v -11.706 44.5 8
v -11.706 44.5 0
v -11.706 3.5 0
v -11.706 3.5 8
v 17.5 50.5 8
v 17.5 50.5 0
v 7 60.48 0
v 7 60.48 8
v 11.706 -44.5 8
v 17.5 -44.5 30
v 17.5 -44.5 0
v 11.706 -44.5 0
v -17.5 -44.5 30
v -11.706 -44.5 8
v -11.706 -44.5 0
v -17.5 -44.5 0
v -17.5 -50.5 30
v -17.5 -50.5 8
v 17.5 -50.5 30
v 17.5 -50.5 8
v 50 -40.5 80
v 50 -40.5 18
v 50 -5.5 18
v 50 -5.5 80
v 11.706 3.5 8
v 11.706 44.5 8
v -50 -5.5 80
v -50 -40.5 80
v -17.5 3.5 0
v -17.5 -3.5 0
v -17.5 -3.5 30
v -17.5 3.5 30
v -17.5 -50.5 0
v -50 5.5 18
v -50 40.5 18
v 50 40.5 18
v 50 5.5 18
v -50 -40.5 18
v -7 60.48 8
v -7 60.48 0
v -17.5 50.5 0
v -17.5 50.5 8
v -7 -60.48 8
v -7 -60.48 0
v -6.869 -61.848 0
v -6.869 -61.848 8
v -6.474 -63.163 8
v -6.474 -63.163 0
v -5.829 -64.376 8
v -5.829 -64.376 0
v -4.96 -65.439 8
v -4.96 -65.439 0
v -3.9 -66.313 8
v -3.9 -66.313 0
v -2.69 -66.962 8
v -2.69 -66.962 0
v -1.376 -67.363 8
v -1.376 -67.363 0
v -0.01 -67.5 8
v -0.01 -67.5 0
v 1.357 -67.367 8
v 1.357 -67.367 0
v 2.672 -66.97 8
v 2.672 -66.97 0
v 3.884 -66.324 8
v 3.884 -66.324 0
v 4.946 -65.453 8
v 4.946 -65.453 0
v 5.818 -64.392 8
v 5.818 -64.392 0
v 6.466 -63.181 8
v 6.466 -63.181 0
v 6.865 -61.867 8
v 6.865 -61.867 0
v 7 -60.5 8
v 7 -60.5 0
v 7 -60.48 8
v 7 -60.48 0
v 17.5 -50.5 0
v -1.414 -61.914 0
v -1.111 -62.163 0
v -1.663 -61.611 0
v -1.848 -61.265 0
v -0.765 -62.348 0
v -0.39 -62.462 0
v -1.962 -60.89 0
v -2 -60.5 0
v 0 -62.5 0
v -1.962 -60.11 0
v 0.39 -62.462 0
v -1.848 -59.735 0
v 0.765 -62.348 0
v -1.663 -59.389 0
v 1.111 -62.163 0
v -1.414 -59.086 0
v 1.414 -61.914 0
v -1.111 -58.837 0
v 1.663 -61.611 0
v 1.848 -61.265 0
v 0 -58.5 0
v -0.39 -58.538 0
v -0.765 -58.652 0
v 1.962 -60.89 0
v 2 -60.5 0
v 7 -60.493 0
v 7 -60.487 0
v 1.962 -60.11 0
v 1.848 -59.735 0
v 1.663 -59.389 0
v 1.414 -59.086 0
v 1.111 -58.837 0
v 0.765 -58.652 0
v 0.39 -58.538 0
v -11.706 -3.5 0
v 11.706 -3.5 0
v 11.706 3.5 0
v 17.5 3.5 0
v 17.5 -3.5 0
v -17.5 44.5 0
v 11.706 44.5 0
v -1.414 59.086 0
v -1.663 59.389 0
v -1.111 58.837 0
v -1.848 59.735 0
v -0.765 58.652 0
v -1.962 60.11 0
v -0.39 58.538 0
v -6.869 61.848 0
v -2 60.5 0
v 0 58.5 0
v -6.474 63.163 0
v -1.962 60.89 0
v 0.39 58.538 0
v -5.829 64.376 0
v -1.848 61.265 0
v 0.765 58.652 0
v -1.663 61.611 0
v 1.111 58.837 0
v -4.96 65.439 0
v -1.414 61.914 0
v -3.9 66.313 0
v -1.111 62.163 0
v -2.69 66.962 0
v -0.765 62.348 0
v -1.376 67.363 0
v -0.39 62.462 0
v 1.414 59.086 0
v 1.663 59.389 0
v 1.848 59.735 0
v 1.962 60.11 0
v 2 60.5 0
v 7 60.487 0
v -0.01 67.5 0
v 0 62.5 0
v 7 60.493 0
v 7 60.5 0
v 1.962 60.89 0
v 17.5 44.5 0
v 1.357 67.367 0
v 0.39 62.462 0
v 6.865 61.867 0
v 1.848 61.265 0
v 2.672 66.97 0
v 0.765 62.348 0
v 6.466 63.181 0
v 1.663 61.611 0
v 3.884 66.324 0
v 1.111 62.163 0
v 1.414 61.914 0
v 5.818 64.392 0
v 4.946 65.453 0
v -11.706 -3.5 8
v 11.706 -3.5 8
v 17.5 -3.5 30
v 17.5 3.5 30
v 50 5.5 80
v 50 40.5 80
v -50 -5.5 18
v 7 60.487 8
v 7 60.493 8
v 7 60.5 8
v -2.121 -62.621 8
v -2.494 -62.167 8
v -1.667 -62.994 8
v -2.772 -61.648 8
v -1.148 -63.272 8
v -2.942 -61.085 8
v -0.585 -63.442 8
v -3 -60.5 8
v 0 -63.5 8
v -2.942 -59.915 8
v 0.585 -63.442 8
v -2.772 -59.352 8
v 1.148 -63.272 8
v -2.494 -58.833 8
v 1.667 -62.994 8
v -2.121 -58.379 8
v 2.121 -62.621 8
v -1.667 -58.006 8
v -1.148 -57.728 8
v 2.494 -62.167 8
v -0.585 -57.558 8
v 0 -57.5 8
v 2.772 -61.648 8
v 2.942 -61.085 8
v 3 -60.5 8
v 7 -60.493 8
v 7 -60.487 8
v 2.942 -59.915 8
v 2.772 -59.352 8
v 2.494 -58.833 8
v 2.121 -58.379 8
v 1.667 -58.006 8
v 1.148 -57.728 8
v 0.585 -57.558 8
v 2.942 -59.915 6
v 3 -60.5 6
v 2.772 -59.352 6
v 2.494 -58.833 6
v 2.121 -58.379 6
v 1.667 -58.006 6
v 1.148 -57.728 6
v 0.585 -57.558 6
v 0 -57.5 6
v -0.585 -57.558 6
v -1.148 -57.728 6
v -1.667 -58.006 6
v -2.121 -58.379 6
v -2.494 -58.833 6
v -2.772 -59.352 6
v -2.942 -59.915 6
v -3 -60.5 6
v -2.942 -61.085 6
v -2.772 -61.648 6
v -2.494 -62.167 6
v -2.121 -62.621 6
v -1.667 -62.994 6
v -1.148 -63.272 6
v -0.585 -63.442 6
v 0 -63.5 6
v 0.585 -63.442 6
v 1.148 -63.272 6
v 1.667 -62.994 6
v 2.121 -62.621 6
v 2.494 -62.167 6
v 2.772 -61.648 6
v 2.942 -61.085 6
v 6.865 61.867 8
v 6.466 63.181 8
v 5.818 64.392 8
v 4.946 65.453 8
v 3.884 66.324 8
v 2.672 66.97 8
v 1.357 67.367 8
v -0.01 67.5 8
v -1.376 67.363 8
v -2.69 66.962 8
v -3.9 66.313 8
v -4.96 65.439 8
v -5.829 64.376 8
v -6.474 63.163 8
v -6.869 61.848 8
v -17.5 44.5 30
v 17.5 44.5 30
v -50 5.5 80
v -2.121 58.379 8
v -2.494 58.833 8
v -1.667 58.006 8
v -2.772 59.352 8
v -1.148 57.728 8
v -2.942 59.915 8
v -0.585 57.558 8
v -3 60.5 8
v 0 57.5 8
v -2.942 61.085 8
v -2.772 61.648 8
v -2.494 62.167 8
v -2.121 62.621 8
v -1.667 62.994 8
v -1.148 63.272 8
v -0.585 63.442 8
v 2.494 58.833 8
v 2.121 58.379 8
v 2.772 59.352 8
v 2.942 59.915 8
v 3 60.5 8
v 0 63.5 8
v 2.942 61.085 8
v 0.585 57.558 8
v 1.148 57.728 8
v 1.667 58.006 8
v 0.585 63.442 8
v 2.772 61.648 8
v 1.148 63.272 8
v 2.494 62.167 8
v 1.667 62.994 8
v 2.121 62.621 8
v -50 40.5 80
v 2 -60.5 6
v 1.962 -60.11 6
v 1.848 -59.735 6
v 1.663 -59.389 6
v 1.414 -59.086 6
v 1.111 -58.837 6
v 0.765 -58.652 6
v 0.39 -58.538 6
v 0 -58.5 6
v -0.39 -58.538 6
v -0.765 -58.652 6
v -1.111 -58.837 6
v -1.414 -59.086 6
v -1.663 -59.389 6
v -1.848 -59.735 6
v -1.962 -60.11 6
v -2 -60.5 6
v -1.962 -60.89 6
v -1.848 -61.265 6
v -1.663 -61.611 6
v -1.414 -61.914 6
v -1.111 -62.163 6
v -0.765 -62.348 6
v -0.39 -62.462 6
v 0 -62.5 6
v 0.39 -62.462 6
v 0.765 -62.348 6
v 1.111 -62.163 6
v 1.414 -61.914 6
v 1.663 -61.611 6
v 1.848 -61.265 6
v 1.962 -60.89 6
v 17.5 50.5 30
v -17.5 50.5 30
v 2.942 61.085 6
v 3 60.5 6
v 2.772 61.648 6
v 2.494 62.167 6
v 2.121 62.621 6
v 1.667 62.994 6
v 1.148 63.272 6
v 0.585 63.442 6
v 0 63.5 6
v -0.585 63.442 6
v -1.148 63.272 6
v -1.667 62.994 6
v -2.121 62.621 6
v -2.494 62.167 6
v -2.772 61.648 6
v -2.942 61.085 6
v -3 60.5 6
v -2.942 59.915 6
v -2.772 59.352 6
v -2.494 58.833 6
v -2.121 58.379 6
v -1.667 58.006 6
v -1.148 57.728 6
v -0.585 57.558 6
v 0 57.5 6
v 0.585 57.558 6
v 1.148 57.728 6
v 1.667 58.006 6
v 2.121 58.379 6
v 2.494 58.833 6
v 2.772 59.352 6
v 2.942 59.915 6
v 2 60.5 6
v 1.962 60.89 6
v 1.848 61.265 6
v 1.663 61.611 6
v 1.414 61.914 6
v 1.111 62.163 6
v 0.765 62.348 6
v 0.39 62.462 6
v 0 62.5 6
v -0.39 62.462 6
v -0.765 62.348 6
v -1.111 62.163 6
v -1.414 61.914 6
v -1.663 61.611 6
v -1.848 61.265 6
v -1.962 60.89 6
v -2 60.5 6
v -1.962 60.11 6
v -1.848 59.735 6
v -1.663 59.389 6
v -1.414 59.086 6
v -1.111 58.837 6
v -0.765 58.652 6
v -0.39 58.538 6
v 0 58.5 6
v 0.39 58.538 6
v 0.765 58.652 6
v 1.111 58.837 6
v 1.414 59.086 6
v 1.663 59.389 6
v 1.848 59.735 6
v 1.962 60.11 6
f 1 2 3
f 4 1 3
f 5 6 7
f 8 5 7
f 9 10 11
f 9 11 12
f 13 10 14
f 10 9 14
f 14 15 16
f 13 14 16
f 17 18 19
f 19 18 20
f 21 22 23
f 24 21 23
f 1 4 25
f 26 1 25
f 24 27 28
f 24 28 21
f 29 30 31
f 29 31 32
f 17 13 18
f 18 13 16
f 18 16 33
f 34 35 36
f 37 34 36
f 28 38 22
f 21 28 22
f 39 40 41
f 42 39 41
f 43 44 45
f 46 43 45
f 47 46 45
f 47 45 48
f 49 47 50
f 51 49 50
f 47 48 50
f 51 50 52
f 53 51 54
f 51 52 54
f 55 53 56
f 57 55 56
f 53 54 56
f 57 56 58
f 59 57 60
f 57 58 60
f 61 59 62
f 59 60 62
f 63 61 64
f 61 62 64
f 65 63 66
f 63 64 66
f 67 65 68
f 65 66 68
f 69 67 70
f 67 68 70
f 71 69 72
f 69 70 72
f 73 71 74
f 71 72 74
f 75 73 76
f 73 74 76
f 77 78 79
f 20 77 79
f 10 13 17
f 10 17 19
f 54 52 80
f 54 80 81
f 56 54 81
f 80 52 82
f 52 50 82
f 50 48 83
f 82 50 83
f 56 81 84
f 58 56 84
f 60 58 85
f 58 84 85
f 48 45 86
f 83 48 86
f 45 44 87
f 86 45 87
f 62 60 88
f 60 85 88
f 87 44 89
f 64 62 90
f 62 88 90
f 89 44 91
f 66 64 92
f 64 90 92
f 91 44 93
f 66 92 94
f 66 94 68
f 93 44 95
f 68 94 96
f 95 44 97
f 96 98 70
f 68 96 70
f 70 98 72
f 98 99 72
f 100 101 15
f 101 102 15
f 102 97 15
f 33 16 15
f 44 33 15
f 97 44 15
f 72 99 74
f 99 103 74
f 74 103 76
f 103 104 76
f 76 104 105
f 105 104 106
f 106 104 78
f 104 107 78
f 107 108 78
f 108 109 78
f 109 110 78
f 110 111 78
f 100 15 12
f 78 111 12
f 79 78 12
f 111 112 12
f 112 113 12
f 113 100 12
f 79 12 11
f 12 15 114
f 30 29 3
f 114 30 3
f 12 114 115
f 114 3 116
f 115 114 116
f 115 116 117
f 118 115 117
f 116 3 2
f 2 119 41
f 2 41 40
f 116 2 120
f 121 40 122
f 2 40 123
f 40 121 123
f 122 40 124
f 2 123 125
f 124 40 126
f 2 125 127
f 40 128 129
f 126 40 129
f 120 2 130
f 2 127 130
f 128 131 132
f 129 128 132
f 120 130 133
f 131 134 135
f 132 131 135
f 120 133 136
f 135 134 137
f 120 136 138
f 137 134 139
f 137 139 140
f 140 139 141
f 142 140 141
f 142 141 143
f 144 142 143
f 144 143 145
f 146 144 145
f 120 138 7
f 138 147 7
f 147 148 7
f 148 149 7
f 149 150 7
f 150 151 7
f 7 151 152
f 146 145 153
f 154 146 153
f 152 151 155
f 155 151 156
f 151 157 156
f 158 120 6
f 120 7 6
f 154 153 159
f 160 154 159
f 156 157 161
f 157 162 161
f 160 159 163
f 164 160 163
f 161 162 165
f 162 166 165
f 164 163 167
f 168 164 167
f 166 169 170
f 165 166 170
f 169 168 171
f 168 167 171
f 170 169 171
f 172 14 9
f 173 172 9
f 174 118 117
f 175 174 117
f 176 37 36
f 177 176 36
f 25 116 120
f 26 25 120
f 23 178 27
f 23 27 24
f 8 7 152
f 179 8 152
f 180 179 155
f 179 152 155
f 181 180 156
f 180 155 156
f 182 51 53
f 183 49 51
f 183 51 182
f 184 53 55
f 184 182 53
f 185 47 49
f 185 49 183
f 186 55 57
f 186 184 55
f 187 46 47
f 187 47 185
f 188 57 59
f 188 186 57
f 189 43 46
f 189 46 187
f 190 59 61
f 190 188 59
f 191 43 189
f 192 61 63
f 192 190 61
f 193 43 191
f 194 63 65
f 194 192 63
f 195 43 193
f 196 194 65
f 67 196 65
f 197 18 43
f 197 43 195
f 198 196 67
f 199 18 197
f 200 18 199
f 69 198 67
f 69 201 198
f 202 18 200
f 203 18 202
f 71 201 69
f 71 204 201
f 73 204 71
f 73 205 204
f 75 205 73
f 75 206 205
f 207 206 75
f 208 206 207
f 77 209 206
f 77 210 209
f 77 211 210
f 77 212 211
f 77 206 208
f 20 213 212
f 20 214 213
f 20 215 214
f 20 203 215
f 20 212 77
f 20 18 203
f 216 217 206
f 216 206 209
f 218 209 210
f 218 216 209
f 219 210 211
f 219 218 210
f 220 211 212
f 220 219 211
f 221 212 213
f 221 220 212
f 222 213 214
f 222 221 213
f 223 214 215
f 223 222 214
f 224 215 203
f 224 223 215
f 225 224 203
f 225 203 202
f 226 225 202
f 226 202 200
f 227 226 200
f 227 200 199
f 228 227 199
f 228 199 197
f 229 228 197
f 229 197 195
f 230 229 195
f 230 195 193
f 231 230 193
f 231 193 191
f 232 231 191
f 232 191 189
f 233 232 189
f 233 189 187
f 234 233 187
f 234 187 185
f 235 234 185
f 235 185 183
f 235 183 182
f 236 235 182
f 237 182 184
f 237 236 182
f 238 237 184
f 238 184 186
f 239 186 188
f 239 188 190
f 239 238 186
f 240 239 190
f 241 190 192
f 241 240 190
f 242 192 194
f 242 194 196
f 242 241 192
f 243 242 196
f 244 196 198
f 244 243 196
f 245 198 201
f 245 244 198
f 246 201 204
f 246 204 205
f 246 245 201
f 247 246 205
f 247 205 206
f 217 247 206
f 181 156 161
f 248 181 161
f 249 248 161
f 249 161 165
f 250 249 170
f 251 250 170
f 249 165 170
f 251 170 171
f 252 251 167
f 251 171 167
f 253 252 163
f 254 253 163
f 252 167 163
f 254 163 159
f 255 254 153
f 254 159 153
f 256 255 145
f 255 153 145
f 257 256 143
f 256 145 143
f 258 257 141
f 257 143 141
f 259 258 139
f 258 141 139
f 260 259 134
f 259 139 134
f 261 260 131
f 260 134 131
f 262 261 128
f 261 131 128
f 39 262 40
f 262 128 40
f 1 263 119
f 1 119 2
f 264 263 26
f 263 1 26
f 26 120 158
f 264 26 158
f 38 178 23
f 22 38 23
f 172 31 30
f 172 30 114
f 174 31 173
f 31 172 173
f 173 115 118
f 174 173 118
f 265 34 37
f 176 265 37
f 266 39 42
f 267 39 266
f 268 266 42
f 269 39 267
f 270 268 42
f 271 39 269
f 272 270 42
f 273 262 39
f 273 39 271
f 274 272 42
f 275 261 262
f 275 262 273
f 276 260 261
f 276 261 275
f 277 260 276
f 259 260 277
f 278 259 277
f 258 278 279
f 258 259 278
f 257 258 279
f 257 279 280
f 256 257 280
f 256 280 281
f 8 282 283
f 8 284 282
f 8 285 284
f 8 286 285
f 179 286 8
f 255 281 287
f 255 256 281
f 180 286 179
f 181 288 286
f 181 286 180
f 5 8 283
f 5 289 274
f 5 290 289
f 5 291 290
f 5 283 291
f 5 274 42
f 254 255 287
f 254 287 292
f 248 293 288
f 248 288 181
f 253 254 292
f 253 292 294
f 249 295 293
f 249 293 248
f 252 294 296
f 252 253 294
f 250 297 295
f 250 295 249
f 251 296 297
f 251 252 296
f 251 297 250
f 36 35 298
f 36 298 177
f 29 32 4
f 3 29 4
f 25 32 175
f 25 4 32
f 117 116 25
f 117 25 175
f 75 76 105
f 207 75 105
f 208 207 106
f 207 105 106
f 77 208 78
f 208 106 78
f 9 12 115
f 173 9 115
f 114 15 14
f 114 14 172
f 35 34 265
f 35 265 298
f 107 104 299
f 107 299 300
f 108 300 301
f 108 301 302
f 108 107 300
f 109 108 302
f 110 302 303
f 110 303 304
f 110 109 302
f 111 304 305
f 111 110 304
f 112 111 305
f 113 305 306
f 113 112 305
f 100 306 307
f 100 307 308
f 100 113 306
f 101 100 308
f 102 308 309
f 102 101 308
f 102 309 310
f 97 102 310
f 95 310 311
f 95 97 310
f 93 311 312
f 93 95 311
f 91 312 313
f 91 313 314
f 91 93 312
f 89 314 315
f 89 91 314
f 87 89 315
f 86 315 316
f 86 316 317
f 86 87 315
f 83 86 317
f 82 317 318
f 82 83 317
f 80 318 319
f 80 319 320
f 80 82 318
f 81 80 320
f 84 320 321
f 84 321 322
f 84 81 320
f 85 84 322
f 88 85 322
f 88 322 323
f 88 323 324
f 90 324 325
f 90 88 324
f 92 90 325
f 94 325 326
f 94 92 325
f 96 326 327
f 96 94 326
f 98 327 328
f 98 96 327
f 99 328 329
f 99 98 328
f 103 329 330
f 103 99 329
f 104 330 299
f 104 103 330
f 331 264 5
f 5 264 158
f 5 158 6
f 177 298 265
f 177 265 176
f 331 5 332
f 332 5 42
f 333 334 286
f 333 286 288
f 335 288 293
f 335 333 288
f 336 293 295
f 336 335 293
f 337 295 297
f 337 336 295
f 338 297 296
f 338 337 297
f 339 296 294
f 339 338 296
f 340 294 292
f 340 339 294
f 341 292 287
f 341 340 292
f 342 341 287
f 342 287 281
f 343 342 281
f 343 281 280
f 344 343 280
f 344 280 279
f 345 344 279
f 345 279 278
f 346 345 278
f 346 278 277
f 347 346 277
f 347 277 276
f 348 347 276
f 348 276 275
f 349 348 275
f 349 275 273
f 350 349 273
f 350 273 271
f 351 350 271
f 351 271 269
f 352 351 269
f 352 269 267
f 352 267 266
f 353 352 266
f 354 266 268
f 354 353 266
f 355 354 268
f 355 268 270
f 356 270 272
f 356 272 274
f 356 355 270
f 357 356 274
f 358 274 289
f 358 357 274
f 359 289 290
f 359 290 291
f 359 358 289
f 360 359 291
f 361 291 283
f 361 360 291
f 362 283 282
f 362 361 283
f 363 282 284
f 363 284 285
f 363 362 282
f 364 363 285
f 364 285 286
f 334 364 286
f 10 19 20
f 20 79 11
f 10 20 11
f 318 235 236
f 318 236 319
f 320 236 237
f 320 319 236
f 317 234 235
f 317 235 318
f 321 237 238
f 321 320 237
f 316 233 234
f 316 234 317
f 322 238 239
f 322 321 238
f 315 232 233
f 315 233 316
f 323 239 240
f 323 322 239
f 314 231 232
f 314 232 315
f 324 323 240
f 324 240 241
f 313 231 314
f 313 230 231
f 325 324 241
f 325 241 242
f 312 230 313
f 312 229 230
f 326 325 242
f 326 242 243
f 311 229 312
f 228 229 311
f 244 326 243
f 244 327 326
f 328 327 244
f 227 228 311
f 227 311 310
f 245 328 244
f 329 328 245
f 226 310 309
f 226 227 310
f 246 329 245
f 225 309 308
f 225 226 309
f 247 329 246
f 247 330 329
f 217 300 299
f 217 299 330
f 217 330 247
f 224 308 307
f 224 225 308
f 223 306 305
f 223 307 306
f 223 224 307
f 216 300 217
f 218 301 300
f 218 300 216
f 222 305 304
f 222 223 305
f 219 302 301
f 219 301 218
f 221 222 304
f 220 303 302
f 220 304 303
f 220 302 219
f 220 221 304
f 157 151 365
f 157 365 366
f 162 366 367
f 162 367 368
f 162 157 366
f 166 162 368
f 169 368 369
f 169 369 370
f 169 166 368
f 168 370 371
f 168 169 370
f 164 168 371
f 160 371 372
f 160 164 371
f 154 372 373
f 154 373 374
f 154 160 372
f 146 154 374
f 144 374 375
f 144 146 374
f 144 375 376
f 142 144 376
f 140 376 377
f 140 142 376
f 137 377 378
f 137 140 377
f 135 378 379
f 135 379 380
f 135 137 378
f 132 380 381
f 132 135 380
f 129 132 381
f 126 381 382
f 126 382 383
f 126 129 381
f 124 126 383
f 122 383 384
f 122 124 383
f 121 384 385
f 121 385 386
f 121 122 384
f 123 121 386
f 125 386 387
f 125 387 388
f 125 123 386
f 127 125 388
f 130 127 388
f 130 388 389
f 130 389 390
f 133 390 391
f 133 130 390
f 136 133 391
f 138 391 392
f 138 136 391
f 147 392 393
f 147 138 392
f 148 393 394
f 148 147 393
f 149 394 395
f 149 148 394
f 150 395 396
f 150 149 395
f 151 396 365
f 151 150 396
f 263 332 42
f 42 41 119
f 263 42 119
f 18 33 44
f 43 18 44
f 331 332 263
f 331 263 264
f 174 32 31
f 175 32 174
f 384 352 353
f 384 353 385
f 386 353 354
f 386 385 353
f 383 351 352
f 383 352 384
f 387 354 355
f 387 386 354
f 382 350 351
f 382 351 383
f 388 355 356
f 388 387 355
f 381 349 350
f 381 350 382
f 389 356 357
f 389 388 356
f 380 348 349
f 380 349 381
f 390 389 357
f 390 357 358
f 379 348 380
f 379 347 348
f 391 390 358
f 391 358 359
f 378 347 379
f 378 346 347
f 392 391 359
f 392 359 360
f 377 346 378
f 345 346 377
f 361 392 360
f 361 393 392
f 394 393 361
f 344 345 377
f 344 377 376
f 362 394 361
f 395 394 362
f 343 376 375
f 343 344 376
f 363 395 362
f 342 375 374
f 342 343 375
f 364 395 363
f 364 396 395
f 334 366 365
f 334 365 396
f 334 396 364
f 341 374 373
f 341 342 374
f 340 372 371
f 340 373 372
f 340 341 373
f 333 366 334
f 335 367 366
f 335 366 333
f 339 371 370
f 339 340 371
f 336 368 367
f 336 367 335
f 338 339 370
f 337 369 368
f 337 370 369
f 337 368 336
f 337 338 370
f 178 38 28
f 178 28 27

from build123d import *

# Parameters (mm, degrees)
F3_START = 18
F2_W     = 100
F2_H     = 35
F3_DEPTH = 62
F4_R     = 3
F4_W     = 23.4121587127
F4_H     = 41
F4_W_2   = 5.7939206436
F4_H_2   = 7
F5_DEPTH = 8
F6_DEPTH = 30
F4_R_2   = 2
F7_DEPTH = 6


with BuildPart() as f3:
    # F2 (on Top) → F3 (new body)
    with BuildSketch(Plane.XY.offset(F3_START)):
        with Locations((0, 23)):
            Rectangle(F2_W, F2_H)
    extrude(amount=F3_DEPTH)


with BuildPart() as f3b:
    # F2 (on Top) → F3, piece 2 (new body)
    with BuildSketch(Plane.XY.offset(F3_START)):
        with Locations((0, -23)):
            Rectangle(F2_W, F2_H)
    extrude(amount=F3_DEPTH)


with BuildPart() as f5:
    # F4 (on Top) → F5 (new body)
    with BuildSketch(Plane.XY):
        with BuildLine():
            ThreePointArc((-6.9999723653, 60.4803306038), (0, 53.5), (6.9999723653, 60.4803306038))
            ThreePointArc((6.9999723653, 60.4803306038), (6.9999930913, 60.4901652922), (7, 60.5))
            ThreePointArc((7, 60.5), (-0.0098347078, 67.4999930913), (-6.9999723653, 60.4803306038))
        make_face()
        with Locations((0, 60.5)):
            Circle(F4_R, mode=Mode.SUBTRACT)
        with BuildLine():
            Line((-17.5, 50.5), (17.5, 50.5))
            Line((17.5, 50.5), (6.9999723653, 60.4803306038))
            ThreePointArc((6.9999723653, 60.4803306038), (0, 53.5), (-6.9999723653, 60.4803306038))
            Line((-6.9999723653, 60.4803306038), (-17.5, 50.5))
        make_face()
        Polygon((-11.7060793564, 44.5), (11.7060793564, 44.5), (17.5, 44.5), (17.5, 50.5), (-17.5, 50.5), (-17.5, 44.5), align=None)
        with Locations((0, 24)):
            Rectangle(F4_W, F4_H)
        with Locations((14.6030396782, 0)):
            Rectangle(F4_W_2, F4_H_2)
        Rectangle(F4_W, F4_H_2)
        with Locations((-14.6030396782, 0)):
            Rectangle(F4_W_2, F4_H_2)
        with Locations((0, -24)):
            Rectangle(F4_W, F4_H)
        Polygon((17.5, -44.5), (11.7060793564, -44.5), (-11.7060793564, -44.5), (-17.5, -44.5), (-17.5, -50.5), (17.5, -50.5), align=None)
        with BuildLine():
            Line((6.9999723653, -60.4803306038), (17.5, -50.5))
            Line((17.5, -50.5), (-17.5, -50.5))
            Line((-17.5, -50.5), (-6.9999723653, -60.4803306038))
            ThreePointArc((-6.9999723653, -60.4803306038), (0, -53.5), (6.9999723653, -60.4803306038))
        make_face()
        with BuildLine():
            ThreePointArc((7, -60.5), (6.9999930913, -60.4901652922), (6.9999723653, -60.4803306038))
            ThreePointArc((6.9999723653, -60.4803306038), (0, -53.5), (-6.9999723653, -60.4803306038))
            ThreePointArc((-6.9999723653, -60.4803306038), (-0.0098347078, -67.4999930913), (7, -60.5))
        make_face()
        with Locations((0, -60.5)):
            Circle(F4_R, mode=Mode.SUBTRACT)
    extrude(amount=F5_DEPTH)

    # F4 (on Top) → F6 (join)
    with BuildSketch(Plane.XY):
        with Locations((14.6030396782, 0)):
            Rectangle(F4_W_2, F4_H_2)
        Rectangle(F4_W, F4_H_2)
        with Locations((-14.6030396782, 0)):
            Rectangle(F4_W_2, F4_H_2)
        Polygon((17.5, -44.5), (11.7060793564, -44.5), (-11.7060793564, -44.5), (-17.5, -44.5), (-17.5, -50.5), (17.5, -50.5), align=None)
        Polygon((-11.7060793564, 44.5), (11.7060793564, 44.5), (17.5, 44.5), (17.5, 50.5), (-17.5, 50.5), (-17.5, 44.5), align=None)
    extrude(amount=F6_DEPTH)

    # F4 (on Top) → F7 (join)
    with BuildSketch(Plane.XY):
        with Locations((0, 60.5)):
            Circle(F4_R)
        with Locations((0, 60.5)):
            Circle(F4_R_2, mode=Mode.SUBTRACT)
        with Locations((0, -60.5)):
            Circle(F4_R)
        with Locations((0, -60.5)):
            Circle(F4_R_2, mode=Mode.SUBTRACT)
    extrude(amount=F7_DEPTH)


solid = Compound([f3.part, f3b.part, f5.part])
